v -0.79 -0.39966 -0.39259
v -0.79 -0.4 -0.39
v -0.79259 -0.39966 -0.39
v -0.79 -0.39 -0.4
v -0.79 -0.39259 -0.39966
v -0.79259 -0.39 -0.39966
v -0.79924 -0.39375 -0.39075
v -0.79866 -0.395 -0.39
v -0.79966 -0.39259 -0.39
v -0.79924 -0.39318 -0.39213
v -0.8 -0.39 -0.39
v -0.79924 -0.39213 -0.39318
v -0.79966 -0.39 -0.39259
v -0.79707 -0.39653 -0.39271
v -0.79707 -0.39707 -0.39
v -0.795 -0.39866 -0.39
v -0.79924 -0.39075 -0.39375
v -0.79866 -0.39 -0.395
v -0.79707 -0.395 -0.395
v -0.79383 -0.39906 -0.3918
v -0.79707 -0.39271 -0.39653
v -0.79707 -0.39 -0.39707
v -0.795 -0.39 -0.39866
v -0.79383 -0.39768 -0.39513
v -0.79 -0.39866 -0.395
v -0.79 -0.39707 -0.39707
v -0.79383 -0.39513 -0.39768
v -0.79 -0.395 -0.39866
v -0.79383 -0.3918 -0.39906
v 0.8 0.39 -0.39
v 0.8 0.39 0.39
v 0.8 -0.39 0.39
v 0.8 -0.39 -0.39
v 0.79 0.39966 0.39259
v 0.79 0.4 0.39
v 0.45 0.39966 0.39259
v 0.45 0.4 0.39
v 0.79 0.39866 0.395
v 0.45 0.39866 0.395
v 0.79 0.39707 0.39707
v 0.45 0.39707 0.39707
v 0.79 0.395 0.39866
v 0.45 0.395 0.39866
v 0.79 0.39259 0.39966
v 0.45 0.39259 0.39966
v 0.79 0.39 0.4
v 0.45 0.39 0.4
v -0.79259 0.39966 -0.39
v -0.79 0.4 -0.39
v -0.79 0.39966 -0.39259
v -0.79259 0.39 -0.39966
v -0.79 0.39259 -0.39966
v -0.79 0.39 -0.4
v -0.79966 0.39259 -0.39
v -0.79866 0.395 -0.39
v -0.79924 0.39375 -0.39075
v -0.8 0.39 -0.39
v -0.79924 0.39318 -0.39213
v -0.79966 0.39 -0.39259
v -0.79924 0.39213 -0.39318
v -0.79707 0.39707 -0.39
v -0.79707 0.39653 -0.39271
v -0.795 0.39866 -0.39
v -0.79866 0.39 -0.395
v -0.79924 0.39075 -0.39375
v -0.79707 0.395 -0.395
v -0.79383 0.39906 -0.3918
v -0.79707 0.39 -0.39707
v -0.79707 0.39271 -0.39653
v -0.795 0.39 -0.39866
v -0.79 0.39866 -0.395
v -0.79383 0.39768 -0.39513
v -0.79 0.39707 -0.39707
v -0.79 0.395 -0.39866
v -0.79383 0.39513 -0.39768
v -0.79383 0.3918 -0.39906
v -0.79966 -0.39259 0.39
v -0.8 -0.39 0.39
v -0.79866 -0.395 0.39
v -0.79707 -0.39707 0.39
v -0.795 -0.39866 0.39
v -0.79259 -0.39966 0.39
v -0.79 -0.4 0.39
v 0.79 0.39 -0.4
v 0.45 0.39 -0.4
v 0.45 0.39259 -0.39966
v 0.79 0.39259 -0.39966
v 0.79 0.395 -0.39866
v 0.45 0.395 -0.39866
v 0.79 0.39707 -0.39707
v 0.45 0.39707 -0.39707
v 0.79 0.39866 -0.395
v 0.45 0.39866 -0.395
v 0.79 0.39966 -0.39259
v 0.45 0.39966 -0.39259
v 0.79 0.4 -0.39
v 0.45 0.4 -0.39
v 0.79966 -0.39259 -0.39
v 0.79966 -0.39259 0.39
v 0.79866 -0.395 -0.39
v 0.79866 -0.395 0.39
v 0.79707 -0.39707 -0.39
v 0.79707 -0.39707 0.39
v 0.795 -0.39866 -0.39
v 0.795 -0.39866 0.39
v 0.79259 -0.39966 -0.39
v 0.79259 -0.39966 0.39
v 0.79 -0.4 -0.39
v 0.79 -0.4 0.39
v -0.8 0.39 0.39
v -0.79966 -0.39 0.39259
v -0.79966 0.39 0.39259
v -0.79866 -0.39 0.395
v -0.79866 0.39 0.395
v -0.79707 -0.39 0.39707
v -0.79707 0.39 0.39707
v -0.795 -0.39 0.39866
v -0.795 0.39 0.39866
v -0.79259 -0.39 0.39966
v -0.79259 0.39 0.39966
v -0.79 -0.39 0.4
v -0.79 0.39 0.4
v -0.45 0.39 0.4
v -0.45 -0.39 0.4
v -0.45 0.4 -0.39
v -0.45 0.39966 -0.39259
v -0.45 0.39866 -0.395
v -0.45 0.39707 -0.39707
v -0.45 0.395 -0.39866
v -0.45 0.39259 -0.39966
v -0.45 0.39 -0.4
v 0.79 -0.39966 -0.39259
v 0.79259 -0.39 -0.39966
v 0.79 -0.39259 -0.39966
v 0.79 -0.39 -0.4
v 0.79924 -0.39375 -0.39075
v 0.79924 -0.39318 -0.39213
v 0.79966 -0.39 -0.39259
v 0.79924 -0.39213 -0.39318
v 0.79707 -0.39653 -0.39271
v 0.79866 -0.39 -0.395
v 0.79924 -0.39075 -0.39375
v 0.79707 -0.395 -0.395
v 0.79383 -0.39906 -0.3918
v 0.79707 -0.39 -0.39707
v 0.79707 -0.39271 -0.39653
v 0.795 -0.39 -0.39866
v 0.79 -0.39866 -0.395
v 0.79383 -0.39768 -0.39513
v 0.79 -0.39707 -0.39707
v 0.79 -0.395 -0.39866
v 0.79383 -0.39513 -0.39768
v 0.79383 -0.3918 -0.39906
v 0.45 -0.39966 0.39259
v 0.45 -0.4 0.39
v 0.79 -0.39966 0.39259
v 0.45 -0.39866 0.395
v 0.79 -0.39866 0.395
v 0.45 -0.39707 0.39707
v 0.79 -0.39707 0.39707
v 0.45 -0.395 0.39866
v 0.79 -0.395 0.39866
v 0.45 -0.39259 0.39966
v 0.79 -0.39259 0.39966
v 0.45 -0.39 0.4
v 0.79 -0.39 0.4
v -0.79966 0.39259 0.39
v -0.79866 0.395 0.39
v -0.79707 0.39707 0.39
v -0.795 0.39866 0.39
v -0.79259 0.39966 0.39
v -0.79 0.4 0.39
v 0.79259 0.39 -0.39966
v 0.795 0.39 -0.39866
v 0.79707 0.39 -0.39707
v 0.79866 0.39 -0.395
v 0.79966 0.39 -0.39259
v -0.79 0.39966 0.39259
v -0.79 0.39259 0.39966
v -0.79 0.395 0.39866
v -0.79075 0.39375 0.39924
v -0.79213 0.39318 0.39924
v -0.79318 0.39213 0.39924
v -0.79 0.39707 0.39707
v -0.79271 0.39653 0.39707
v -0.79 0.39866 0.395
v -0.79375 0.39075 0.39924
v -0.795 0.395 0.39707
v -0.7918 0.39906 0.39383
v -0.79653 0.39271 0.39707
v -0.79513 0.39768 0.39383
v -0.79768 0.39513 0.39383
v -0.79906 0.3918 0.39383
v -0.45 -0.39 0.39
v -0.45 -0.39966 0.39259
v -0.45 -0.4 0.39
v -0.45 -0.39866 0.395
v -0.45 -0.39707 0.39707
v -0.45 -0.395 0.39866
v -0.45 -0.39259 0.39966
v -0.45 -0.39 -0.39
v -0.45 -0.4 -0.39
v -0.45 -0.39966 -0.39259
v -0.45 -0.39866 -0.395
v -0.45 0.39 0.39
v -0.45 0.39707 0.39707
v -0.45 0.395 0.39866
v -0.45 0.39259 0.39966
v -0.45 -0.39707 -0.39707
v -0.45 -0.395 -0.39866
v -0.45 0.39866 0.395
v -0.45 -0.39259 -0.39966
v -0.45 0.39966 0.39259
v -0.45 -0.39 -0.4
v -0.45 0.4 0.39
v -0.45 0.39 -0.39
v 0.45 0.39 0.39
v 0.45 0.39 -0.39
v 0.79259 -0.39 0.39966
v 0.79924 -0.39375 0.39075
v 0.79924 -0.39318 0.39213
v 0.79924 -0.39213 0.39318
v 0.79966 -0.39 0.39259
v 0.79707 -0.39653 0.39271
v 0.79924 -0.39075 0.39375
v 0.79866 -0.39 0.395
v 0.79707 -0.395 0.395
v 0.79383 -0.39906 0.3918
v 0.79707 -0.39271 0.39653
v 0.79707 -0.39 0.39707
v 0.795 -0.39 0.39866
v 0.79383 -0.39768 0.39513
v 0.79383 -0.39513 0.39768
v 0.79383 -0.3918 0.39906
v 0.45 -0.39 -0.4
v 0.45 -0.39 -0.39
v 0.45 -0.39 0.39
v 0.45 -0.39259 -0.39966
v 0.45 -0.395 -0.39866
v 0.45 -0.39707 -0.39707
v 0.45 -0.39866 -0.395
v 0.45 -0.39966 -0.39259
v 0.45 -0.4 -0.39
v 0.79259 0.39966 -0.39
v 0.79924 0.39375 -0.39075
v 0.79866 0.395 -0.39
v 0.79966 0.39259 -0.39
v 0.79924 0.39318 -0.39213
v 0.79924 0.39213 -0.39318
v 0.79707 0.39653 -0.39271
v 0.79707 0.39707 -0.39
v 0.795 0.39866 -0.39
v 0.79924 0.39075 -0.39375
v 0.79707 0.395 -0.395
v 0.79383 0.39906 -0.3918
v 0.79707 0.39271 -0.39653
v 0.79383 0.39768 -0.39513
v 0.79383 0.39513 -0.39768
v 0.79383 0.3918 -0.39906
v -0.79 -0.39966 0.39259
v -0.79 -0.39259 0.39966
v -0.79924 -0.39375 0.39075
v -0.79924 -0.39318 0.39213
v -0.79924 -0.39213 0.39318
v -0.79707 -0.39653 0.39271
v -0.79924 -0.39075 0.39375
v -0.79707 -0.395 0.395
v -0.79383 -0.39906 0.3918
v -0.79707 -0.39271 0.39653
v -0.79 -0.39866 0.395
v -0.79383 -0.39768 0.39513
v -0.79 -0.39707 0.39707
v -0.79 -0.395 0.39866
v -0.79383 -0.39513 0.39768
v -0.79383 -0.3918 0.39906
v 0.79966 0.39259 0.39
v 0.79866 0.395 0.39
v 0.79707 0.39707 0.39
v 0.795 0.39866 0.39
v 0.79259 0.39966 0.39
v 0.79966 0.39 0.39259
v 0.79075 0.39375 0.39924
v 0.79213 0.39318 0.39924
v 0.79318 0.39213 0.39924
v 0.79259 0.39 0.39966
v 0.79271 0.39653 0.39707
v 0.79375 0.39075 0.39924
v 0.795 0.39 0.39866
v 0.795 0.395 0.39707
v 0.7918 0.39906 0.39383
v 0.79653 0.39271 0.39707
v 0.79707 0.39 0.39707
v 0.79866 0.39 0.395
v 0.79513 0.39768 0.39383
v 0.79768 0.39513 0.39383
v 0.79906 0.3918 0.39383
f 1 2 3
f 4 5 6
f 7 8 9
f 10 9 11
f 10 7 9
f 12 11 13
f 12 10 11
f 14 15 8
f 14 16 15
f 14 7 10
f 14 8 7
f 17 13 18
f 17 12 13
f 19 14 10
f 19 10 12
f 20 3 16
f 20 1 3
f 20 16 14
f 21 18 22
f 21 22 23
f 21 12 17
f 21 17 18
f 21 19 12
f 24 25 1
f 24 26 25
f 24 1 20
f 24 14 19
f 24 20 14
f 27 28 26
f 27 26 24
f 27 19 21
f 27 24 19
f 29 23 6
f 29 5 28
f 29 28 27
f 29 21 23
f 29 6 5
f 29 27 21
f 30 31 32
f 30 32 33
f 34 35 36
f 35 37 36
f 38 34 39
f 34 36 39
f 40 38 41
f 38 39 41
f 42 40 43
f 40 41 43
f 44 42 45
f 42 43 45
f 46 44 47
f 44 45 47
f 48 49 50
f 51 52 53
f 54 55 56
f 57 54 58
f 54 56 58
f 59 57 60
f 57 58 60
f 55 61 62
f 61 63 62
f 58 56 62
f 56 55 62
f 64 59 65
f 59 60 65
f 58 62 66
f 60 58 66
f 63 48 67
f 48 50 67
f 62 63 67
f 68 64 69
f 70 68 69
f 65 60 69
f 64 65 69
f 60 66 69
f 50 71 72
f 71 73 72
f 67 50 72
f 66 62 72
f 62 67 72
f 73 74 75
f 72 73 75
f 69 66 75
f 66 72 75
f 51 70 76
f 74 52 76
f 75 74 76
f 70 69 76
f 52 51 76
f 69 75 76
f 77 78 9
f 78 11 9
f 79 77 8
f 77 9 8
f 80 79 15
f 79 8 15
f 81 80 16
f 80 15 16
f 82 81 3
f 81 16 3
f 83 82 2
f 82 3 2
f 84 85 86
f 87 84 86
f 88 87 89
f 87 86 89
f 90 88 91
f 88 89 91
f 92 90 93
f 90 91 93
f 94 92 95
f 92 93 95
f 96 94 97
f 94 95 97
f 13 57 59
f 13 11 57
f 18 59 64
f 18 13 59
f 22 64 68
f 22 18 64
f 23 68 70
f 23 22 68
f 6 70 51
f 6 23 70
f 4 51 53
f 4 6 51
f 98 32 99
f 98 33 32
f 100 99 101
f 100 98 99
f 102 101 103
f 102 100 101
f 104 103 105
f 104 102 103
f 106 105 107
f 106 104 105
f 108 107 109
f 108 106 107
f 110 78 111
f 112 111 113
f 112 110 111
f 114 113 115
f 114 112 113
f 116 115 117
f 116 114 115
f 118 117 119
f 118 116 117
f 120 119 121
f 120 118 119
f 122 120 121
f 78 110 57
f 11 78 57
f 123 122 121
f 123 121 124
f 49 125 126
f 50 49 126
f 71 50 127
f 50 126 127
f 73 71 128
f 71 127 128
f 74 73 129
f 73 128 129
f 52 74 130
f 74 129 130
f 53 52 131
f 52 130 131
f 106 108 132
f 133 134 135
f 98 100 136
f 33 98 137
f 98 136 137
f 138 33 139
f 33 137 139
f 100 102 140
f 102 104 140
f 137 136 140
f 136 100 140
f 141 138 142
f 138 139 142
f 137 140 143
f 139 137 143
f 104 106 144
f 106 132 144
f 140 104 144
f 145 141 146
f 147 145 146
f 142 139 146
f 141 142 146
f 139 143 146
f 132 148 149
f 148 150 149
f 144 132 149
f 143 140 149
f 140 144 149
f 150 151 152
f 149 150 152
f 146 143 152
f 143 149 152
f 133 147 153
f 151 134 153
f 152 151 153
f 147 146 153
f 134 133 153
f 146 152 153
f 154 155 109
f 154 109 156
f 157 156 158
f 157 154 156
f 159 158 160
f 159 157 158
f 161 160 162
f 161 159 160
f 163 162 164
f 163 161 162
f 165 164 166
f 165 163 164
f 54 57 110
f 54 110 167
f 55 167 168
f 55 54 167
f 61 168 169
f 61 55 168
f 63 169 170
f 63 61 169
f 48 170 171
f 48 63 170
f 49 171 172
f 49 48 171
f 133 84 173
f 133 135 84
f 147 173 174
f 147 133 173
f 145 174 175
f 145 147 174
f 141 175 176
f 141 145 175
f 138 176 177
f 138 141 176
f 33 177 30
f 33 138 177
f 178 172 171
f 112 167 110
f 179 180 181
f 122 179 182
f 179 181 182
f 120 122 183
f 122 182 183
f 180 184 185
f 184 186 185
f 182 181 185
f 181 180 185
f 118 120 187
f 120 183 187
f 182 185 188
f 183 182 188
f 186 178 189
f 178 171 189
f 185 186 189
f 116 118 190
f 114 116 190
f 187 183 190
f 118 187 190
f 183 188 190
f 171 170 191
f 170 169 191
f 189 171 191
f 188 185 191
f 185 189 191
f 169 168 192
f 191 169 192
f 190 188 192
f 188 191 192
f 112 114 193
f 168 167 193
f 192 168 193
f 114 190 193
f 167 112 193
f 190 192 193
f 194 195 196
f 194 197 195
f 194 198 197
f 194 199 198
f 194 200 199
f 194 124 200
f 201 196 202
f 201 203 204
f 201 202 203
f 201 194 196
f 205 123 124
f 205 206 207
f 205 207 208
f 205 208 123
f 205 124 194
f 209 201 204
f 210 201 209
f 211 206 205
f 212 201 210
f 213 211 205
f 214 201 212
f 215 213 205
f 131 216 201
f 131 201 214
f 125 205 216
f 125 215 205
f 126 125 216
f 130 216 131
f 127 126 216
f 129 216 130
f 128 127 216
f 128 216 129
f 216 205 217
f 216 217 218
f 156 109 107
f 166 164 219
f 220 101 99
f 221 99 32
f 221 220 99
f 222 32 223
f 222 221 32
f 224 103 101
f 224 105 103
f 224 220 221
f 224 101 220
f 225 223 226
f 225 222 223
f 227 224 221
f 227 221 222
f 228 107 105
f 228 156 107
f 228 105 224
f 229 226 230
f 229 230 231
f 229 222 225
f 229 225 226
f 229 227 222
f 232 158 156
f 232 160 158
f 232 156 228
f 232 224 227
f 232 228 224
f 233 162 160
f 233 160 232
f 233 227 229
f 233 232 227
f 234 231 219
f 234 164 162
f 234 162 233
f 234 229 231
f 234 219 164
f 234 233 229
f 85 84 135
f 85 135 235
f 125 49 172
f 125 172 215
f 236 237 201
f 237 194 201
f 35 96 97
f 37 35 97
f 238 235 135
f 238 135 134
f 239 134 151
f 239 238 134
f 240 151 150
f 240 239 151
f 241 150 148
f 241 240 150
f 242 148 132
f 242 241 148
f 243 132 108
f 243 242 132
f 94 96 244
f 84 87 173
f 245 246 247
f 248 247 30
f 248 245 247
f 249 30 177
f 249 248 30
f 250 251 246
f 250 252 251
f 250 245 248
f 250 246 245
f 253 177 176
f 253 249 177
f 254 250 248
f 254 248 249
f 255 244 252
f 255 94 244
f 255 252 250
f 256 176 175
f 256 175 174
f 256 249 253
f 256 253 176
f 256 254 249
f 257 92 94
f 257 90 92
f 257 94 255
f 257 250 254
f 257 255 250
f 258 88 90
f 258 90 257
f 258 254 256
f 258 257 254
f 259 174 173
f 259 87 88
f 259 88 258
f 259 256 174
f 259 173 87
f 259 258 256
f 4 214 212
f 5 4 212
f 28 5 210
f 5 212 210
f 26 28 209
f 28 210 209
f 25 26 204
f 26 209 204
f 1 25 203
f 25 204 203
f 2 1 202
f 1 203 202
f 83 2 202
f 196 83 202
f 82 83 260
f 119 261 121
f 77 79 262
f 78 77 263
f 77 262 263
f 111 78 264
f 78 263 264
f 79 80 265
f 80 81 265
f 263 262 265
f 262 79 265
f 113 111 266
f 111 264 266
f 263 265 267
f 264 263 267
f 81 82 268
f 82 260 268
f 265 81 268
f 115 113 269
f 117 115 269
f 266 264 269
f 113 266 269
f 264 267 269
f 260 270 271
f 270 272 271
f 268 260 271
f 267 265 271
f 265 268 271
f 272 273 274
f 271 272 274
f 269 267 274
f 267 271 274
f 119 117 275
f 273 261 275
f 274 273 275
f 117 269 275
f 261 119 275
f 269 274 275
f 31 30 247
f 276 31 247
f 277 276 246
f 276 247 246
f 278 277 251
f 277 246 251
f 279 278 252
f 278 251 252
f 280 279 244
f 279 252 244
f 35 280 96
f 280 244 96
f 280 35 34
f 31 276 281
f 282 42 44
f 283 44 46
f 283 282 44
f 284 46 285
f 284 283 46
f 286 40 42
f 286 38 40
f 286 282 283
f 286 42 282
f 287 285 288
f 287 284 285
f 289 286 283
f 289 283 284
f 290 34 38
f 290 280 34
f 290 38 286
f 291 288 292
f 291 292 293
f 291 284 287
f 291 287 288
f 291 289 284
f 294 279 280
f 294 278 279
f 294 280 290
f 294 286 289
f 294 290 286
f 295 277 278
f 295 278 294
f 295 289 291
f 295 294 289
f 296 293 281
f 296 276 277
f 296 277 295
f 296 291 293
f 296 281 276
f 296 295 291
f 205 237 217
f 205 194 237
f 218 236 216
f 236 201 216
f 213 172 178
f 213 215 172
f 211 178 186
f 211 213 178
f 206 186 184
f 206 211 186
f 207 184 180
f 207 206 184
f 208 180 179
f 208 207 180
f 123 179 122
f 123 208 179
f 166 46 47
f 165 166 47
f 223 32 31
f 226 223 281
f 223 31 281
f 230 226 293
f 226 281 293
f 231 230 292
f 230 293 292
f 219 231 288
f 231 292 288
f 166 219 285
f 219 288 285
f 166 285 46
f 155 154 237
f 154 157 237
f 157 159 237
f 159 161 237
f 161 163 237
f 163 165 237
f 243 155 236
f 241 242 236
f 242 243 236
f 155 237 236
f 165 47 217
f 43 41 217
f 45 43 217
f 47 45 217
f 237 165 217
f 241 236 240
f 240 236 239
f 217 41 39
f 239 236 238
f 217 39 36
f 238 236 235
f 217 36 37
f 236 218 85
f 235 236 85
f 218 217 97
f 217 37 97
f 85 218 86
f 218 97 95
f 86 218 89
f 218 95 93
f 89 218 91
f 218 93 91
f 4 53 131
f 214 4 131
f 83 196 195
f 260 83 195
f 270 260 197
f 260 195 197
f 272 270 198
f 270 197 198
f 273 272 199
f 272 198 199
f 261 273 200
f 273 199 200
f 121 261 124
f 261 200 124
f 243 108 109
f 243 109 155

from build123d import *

# Parameters (mm, degrees)
SKETCH1_W            = 0.35
SKETCH1_H            = 0.8
THICKNESS_DEPTH      = 0.4
FILLET1_R            = 0.01
SKETCH2_W            = 0.78
SKETCH2_H            = 0.78
BOSS_EXTRUDE2_DEPTH  = 0.45
FILLET1_OF_MIRROR3_R = 0.01


with BuildPart() as part:
    # Sketch1 → THICKNESS (new body, symmetric)
    with BuildSketch(Plane(origin=(0, 0, 0), x_dir=(1, 0, 0), z_dir=(0, 1, 0))):
        with Locations((-0.625, 0)):
            Rectangle(SKETCH1_W, SKETCH1_H)
    thickness = extrude(amount=THICKNESS_DEPTH, both=True)

    # Fillet1
    fillet1_edges = [part.edges().sort_by_distance(p)[0] for p in [
        (-0.625, 0.4, -0.4),
        (-0.8, 0.4, 0),
        (-0.625, -0.4, -0.4),
        (-0.625, -0.4, 0.4),
        (-0.8, -0.4, 0),
        (-0.625, 0.4, 0.4),
        (-0.8, 0, -0.4),
        (-0.8, 0, 0.4),
    ]]
    fillet(fillet1_edges, radius=FILLET1_R)

    # Sketch2 → Boss-Extrude2 (add)
    with BuildSketch(Plane(origin=(0, 0, 0), x_dir=(0, 0, -1), z_dir=(1, 0, 0))):
        Rectangle(SKETCH2_W, SKETCH2_H)
    boss_extrude2 = extrude(amount=-BOSS_EXTRUDE2_DEPTH)

    # Mirror3: THICKNESS, Boss-Extrude2 across plane
    add(thickness.mirror(Plane(origin=(0, 0, 0), x_dir=(0, 0, 1), z_dir=(1, 0, 0))))
    add(boss_extrude2.mirror(Plane(origin=(0, 0, 0), x_dir=(0, 0, 1), z_dir=(1, 0, 0))))

    # Fillet1 of Mirror3
    fillet1_of_mirror3_edges = [part.edges().sort_by_distance(p)[0] for p in [
        (0.625, 0.4, -0.4),
        (0.8, 0.4, 0),
        (0.625, -0.4, -0.4),
        (0.625, -0.4, 0.4),
        (0.8, -0.4, 0),
        (0.625, 0.4, 0.4),
        (0.8, 0, -0.4),
        (0.8, 0, 0.4),
    ]]
    fillet(fillet1_of_mirror3_edges, radius=FILLET1_OF_MIRROR3_R)


solid = part.part
